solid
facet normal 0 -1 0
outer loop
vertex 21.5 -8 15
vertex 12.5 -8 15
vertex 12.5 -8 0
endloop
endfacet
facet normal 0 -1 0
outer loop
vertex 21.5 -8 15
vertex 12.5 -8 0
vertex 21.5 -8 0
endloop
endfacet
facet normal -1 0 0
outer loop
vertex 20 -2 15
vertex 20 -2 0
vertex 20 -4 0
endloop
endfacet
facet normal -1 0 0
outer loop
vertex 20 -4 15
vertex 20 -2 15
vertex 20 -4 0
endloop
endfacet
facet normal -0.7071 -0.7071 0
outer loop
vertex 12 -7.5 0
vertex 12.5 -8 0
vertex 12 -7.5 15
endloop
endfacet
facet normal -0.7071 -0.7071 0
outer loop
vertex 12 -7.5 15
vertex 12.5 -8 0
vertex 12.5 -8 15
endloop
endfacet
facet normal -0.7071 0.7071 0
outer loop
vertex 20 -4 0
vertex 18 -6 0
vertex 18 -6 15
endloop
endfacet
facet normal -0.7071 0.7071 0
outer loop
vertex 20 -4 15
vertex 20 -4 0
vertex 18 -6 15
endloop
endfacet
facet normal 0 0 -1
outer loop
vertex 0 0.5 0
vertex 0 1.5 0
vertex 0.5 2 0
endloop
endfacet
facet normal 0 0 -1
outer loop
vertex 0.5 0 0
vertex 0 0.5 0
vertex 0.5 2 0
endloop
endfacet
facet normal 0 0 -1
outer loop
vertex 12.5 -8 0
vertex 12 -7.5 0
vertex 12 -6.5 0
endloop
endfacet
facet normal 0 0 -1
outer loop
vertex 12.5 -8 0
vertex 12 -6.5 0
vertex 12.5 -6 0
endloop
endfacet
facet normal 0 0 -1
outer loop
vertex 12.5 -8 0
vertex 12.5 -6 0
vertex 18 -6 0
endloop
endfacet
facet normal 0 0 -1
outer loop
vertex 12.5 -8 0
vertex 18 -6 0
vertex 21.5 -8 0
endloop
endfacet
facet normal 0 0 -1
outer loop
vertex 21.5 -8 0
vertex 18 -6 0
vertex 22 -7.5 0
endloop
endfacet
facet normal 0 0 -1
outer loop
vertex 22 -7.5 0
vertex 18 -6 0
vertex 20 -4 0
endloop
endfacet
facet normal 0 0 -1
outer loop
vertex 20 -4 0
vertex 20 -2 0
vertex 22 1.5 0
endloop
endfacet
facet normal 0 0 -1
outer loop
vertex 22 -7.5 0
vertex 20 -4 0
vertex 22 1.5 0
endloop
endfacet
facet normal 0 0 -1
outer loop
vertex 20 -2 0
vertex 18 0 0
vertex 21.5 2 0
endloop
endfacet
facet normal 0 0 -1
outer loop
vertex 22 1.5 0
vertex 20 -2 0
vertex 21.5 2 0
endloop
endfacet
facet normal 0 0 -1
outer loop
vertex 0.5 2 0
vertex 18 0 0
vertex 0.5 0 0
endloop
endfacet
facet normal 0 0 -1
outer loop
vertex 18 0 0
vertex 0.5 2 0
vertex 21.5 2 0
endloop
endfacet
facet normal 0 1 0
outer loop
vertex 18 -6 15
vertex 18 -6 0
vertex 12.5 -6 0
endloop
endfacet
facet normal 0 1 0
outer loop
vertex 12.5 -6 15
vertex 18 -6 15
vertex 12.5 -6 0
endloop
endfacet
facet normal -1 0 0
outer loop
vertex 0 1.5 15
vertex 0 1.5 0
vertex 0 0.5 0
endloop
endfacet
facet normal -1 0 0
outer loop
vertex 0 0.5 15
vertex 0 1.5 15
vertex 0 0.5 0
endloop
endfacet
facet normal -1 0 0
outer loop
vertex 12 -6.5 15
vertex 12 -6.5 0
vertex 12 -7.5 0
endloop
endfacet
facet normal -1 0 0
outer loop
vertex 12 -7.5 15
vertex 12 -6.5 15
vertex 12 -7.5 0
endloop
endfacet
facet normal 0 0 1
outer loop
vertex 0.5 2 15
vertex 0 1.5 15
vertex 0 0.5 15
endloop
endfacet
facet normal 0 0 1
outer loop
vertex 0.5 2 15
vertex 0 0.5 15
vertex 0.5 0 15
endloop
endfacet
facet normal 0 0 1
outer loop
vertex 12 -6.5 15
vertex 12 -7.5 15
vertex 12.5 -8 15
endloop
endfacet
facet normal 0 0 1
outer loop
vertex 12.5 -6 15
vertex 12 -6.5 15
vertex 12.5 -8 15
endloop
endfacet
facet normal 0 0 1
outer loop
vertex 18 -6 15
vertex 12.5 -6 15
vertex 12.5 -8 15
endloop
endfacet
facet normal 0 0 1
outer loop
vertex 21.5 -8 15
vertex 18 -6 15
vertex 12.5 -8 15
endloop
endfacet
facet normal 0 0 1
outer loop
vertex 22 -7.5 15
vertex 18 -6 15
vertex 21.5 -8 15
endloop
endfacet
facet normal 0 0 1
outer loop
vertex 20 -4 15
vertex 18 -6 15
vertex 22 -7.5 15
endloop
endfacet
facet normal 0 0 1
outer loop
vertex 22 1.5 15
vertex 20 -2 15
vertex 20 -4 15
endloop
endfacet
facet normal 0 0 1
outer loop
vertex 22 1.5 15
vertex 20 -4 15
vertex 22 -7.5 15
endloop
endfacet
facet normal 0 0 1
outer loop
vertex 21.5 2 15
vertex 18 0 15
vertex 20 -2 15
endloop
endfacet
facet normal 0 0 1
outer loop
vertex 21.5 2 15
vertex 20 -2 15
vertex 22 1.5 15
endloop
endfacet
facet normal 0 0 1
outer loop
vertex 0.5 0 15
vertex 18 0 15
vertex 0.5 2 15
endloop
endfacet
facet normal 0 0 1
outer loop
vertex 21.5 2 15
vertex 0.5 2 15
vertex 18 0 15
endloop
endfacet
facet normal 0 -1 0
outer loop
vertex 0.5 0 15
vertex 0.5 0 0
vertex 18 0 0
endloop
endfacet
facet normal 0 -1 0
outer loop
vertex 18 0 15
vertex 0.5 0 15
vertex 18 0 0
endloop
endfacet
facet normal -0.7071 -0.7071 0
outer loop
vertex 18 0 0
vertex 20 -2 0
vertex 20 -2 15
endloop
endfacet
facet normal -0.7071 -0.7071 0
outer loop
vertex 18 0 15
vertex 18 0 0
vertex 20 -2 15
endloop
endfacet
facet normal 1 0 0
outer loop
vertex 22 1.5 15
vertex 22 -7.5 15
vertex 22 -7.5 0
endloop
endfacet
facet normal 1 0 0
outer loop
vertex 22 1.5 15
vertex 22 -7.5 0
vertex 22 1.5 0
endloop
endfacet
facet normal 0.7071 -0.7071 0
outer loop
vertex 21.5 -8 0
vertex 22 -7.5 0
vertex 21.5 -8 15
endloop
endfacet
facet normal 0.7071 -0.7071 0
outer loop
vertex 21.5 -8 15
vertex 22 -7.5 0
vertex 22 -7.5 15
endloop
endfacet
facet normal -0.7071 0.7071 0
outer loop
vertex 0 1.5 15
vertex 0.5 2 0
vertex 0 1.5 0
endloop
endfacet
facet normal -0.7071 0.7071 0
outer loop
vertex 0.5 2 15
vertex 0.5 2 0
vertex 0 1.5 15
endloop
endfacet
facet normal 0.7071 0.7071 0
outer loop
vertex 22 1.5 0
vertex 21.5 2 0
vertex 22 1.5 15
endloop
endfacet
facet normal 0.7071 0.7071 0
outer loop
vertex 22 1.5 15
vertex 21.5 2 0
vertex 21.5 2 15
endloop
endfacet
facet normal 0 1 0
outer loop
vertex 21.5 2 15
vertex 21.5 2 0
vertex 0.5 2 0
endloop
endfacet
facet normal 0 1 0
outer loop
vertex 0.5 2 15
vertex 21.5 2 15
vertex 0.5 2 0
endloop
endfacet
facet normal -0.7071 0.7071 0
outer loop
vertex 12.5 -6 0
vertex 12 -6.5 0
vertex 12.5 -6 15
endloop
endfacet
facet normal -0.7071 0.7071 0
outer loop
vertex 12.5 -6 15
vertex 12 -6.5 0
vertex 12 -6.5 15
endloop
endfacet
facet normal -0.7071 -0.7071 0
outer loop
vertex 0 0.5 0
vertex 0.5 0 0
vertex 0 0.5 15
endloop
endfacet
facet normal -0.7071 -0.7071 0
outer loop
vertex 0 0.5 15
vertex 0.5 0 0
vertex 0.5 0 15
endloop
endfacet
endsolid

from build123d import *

# Parameters (mm, degrees)
F1_DEPTH = 15
F2_SIZE  = 0.5
F3_SIZE  = 2


with BuildPart() as f1:
    # F0 (on Top) → F1 (new body)
    with BuildSketch(Plane.XY):
        Polygon((0, 2), (0, 0), (20, 0), (20, -6), (12, -6), (12, -8), (20, -8), (22, -8), (22, -6), (22, 0), (22, 2), (20, 2), align=None)
    extrude(amount=F1_DEPTH)

    # F2
    f2_edges = [f1.edges().sort_by_distance(p)[0] for p in [
        (0, 2, 7.5),
        (0, 0, 7.5),
        (12, -8, 7.5),
        (12, -6, 7.5),
        (22, -8, 7.5),
        (22, 2, 7.5),
    ]]
    chamfer(f2_edges, length=F2_SIZE)

    # F3
    f3_edges = [f1.edges().sort_by_distance(p)[0] for p in [
        (20, 0, 7.5),
        (20, -6, 7.5),
    ]]
    chamfer(f3_edges, length=F3_SIZE)


solid = f1.part
